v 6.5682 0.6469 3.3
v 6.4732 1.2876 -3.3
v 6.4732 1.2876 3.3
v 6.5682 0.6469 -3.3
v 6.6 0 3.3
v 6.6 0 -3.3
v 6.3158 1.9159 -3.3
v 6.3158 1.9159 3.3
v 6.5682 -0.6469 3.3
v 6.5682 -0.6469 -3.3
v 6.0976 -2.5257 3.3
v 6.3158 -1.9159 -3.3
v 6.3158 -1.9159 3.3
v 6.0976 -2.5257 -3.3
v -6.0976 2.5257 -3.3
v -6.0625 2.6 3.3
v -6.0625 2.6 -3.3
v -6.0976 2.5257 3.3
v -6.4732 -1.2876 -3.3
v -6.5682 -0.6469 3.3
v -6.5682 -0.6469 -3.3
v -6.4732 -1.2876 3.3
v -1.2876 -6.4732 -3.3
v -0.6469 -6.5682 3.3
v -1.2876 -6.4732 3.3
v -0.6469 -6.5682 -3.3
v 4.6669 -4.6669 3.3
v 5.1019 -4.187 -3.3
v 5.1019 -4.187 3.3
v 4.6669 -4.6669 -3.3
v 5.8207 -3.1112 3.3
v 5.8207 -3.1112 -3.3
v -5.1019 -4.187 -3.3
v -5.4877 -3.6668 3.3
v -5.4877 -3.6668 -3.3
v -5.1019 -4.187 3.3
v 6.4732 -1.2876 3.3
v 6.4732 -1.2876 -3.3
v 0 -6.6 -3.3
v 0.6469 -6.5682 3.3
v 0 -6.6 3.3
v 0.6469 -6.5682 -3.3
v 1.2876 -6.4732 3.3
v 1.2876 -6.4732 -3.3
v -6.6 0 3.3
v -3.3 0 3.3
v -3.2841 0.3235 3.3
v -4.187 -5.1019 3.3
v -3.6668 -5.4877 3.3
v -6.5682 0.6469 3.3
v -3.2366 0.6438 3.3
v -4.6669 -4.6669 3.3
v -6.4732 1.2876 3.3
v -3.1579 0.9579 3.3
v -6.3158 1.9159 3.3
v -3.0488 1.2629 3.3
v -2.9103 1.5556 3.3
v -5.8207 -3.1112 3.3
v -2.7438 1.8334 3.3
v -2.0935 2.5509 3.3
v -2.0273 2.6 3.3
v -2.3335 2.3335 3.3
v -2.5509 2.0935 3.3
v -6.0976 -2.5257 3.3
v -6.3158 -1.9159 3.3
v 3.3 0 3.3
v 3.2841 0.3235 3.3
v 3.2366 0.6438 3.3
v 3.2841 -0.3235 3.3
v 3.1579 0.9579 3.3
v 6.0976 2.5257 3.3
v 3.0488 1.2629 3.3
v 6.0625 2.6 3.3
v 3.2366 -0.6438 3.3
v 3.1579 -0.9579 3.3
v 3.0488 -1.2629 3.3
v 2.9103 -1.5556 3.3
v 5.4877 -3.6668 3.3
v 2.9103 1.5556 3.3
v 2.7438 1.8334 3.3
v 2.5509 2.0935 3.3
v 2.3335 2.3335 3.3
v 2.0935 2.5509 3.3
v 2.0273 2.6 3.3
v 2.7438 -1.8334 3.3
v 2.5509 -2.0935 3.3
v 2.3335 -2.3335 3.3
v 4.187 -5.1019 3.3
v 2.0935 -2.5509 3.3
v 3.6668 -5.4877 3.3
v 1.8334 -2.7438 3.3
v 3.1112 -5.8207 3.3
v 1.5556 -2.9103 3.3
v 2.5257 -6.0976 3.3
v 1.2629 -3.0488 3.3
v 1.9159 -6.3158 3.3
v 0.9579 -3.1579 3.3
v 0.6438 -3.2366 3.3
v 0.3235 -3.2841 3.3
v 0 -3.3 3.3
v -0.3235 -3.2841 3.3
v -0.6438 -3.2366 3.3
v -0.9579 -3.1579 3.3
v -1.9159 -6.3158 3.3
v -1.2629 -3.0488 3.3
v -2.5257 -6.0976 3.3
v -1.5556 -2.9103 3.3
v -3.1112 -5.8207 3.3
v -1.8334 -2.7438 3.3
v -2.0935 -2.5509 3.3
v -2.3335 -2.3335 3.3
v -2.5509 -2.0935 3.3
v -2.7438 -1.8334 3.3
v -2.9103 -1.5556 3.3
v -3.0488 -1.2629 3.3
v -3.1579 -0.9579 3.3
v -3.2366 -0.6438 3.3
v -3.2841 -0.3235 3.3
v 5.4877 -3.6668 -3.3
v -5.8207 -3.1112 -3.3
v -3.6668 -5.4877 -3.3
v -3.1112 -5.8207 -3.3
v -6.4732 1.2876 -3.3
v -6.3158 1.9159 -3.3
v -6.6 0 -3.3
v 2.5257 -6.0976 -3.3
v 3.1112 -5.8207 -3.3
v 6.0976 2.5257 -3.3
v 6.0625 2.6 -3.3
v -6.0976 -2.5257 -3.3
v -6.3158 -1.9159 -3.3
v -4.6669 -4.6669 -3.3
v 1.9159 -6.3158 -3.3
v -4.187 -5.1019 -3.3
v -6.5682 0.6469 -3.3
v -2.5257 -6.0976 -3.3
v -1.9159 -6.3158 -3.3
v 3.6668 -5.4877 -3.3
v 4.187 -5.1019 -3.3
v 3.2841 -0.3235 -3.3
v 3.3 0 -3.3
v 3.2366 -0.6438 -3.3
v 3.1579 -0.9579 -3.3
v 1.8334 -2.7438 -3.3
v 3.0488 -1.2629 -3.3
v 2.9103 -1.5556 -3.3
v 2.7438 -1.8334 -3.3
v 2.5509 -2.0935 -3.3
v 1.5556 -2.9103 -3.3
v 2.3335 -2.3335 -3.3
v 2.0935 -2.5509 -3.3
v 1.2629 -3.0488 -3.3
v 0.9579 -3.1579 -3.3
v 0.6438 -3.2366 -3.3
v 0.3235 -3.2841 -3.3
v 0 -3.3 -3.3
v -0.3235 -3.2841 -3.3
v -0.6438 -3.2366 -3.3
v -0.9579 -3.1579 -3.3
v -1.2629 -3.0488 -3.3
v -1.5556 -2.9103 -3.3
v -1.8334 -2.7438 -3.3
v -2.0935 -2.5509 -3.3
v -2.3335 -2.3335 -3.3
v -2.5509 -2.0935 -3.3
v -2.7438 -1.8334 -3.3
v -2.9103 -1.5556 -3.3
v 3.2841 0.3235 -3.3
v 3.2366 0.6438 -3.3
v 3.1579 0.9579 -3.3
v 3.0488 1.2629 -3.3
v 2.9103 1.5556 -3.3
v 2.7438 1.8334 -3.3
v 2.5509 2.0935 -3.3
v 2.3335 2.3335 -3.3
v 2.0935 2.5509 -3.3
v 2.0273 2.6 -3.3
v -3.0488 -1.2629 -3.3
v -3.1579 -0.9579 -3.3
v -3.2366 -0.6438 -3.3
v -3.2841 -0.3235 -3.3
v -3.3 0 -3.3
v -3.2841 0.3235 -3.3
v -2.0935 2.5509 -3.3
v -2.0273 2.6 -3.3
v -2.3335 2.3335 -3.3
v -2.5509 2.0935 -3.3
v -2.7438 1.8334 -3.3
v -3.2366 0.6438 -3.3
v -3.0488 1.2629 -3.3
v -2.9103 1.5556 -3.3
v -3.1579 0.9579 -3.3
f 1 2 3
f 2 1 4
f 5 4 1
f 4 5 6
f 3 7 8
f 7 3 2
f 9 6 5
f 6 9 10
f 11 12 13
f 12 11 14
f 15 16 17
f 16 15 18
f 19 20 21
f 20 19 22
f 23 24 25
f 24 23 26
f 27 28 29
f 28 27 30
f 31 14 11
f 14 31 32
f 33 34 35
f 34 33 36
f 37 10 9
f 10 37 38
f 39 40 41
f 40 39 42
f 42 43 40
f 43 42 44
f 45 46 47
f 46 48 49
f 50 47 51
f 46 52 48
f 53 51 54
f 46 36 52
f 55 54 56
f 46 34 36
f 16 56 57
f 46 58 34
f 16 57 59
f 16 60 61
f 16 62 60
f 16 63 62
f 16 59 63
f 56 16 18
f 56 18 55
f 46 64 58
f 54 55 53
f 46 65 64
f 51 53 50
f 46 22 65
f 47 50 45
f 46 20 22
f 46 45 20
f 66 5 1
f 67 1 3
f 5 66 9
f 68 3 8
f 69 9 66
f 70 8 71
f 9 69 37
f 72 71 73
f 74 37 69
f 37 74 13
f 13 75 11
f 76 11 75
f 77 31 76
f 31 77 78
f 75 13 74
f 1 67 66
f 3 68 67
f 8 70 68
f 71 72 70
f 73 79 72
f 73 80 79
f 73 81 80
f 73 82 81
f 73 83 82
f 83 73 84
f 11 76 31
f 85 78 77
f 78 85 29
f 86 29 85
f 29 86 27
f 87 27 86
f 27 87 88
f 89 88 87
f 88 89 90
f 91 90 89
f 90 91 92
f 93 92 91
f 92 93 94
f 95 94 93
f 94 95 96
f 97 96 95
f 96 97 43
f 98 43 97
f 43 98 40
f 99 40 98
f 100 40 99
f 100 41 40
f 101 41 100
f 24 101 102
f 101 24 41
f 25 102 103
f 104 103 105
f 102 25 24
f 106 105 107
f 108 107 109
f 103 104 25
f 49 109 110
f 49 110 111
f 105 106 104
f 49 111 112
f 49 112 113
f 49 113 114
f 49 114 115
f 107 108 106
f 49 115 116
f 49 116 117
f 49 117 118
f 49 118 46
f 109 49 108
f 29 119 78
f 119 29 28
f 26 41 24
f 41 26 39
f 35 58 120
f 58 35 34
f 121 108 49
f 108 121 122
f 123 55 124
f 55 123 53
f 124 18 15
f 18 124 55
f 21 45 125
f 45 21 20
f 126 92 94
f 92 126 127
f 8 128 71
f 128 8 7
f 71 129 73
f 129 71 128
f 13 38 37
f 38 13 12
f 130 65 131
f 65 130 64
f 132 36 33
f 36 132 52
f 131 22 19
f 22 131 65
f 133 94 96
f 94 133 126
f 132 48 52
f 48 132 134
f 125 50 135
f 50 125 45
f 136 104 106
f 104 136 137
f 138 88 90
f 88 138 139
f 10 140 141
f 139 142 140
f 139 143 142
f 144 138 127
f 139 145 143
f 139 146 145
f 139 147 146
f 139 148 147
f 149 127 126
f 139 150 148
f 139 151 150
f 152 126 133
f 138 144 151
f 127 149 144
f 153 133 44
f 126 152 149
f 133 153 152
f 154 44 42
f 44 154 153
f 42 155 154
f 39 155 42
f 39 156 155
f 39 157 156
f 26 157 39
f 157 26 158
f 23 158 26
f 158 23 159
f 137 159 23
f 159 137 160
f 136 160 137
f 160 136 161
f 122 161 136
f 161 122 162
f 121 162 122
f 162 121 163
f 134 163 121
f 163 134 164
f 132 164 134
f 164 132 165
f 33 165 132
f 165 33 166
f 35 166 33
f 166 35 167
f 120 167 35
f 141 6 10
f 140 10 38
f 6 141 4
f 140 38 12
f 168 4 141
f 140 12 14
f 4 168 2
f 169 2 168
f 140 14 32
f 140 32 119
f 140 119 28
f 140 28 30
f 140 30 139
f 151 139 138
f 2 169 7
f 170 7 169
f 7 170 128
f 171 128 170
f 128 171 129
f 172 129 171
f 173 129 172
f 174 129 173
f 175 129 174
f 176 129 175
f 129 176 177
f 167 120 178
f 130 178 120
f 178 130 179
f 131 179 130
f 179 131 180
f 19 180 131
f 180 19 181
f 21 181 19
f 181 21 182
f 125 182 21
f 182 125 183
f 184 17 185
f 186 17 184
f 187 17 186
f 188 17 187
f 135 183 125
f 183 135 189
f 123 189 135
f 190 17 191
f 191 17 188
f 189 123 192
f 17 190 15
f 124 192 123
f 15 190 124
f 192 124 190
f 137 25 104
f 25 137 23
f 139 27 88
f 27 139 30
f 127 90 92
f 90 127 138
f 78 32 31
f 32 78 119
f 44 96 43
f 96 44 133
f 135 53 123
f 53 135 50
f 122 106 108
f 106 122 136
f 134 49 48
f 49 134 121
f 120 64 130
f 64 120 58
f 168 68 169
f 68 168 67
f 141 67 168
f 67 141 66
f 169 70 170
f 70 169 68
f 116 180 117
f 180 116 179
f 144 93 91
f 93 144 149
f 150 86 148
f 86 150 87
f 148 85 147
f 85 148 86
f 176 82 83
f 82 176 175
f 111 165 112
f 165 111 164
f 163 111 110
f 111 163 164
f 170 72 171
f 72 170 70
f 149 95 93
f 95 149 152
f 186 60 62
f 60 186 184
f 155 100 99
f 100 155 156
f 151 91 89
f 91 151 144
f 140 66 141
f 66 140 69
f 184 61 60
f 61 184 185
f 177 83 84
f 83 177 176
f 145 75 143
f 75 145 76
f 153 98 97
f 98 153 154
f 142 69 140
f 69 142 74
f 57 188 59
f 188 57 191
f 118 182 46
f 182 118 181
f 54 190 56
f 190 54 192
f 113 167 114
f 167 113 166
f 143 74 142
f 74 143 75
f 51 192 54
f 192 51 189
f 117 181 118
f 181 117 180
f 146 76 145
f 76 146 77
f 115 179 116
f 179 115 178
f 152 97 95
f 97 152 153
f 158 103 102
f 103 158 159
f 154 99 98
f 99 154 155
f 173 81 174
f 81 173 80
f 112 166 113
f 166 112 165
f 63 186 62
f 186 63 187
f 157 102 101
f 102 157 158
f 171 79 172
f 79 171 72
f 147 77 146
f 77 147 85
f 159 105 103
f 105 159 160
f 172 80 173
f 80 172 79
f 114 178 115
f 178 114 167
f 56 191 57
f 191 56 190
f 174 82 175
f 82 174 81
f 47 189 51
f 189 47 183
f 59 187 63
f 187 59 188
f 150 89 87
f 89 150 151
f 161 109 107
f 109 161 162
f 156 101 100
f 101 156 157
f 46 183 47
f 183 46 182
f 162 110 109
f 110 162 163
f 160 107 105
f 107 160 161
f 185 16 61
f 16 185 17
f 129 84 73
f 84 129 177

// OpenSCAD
// COBRA Vertebra - T4 V10
// Height: 6.6000000000000005mm, OD: 13.200000000000001mm

$fn = 64;

difference() {
    // Outer cylinder
    cylinder(h=6.6000000000000005, d=13.200000000000001, center=true);
    
    // Inner channel
    cylinder(h=8.600000000000001, d=6.6000000000000005, center=true);

    // Solar panel cavity
    translate([0, 4.6000000000000005, 0])
    cube([50, 4, 30], center=true);

    // Pivot holes
    translate([0, 6.6000000000000005, 0.30000000000000027])
    rotate([90, 0, 0])
    cylinder(h=5.300000000000001, d=4, center=true);
    
    translate([0, 6.6000000000000005, -0.30000000000000027])
    rotate([90, 0, 0])
    cylinder(h=5.300000000000001, d=4, center=true);
}
